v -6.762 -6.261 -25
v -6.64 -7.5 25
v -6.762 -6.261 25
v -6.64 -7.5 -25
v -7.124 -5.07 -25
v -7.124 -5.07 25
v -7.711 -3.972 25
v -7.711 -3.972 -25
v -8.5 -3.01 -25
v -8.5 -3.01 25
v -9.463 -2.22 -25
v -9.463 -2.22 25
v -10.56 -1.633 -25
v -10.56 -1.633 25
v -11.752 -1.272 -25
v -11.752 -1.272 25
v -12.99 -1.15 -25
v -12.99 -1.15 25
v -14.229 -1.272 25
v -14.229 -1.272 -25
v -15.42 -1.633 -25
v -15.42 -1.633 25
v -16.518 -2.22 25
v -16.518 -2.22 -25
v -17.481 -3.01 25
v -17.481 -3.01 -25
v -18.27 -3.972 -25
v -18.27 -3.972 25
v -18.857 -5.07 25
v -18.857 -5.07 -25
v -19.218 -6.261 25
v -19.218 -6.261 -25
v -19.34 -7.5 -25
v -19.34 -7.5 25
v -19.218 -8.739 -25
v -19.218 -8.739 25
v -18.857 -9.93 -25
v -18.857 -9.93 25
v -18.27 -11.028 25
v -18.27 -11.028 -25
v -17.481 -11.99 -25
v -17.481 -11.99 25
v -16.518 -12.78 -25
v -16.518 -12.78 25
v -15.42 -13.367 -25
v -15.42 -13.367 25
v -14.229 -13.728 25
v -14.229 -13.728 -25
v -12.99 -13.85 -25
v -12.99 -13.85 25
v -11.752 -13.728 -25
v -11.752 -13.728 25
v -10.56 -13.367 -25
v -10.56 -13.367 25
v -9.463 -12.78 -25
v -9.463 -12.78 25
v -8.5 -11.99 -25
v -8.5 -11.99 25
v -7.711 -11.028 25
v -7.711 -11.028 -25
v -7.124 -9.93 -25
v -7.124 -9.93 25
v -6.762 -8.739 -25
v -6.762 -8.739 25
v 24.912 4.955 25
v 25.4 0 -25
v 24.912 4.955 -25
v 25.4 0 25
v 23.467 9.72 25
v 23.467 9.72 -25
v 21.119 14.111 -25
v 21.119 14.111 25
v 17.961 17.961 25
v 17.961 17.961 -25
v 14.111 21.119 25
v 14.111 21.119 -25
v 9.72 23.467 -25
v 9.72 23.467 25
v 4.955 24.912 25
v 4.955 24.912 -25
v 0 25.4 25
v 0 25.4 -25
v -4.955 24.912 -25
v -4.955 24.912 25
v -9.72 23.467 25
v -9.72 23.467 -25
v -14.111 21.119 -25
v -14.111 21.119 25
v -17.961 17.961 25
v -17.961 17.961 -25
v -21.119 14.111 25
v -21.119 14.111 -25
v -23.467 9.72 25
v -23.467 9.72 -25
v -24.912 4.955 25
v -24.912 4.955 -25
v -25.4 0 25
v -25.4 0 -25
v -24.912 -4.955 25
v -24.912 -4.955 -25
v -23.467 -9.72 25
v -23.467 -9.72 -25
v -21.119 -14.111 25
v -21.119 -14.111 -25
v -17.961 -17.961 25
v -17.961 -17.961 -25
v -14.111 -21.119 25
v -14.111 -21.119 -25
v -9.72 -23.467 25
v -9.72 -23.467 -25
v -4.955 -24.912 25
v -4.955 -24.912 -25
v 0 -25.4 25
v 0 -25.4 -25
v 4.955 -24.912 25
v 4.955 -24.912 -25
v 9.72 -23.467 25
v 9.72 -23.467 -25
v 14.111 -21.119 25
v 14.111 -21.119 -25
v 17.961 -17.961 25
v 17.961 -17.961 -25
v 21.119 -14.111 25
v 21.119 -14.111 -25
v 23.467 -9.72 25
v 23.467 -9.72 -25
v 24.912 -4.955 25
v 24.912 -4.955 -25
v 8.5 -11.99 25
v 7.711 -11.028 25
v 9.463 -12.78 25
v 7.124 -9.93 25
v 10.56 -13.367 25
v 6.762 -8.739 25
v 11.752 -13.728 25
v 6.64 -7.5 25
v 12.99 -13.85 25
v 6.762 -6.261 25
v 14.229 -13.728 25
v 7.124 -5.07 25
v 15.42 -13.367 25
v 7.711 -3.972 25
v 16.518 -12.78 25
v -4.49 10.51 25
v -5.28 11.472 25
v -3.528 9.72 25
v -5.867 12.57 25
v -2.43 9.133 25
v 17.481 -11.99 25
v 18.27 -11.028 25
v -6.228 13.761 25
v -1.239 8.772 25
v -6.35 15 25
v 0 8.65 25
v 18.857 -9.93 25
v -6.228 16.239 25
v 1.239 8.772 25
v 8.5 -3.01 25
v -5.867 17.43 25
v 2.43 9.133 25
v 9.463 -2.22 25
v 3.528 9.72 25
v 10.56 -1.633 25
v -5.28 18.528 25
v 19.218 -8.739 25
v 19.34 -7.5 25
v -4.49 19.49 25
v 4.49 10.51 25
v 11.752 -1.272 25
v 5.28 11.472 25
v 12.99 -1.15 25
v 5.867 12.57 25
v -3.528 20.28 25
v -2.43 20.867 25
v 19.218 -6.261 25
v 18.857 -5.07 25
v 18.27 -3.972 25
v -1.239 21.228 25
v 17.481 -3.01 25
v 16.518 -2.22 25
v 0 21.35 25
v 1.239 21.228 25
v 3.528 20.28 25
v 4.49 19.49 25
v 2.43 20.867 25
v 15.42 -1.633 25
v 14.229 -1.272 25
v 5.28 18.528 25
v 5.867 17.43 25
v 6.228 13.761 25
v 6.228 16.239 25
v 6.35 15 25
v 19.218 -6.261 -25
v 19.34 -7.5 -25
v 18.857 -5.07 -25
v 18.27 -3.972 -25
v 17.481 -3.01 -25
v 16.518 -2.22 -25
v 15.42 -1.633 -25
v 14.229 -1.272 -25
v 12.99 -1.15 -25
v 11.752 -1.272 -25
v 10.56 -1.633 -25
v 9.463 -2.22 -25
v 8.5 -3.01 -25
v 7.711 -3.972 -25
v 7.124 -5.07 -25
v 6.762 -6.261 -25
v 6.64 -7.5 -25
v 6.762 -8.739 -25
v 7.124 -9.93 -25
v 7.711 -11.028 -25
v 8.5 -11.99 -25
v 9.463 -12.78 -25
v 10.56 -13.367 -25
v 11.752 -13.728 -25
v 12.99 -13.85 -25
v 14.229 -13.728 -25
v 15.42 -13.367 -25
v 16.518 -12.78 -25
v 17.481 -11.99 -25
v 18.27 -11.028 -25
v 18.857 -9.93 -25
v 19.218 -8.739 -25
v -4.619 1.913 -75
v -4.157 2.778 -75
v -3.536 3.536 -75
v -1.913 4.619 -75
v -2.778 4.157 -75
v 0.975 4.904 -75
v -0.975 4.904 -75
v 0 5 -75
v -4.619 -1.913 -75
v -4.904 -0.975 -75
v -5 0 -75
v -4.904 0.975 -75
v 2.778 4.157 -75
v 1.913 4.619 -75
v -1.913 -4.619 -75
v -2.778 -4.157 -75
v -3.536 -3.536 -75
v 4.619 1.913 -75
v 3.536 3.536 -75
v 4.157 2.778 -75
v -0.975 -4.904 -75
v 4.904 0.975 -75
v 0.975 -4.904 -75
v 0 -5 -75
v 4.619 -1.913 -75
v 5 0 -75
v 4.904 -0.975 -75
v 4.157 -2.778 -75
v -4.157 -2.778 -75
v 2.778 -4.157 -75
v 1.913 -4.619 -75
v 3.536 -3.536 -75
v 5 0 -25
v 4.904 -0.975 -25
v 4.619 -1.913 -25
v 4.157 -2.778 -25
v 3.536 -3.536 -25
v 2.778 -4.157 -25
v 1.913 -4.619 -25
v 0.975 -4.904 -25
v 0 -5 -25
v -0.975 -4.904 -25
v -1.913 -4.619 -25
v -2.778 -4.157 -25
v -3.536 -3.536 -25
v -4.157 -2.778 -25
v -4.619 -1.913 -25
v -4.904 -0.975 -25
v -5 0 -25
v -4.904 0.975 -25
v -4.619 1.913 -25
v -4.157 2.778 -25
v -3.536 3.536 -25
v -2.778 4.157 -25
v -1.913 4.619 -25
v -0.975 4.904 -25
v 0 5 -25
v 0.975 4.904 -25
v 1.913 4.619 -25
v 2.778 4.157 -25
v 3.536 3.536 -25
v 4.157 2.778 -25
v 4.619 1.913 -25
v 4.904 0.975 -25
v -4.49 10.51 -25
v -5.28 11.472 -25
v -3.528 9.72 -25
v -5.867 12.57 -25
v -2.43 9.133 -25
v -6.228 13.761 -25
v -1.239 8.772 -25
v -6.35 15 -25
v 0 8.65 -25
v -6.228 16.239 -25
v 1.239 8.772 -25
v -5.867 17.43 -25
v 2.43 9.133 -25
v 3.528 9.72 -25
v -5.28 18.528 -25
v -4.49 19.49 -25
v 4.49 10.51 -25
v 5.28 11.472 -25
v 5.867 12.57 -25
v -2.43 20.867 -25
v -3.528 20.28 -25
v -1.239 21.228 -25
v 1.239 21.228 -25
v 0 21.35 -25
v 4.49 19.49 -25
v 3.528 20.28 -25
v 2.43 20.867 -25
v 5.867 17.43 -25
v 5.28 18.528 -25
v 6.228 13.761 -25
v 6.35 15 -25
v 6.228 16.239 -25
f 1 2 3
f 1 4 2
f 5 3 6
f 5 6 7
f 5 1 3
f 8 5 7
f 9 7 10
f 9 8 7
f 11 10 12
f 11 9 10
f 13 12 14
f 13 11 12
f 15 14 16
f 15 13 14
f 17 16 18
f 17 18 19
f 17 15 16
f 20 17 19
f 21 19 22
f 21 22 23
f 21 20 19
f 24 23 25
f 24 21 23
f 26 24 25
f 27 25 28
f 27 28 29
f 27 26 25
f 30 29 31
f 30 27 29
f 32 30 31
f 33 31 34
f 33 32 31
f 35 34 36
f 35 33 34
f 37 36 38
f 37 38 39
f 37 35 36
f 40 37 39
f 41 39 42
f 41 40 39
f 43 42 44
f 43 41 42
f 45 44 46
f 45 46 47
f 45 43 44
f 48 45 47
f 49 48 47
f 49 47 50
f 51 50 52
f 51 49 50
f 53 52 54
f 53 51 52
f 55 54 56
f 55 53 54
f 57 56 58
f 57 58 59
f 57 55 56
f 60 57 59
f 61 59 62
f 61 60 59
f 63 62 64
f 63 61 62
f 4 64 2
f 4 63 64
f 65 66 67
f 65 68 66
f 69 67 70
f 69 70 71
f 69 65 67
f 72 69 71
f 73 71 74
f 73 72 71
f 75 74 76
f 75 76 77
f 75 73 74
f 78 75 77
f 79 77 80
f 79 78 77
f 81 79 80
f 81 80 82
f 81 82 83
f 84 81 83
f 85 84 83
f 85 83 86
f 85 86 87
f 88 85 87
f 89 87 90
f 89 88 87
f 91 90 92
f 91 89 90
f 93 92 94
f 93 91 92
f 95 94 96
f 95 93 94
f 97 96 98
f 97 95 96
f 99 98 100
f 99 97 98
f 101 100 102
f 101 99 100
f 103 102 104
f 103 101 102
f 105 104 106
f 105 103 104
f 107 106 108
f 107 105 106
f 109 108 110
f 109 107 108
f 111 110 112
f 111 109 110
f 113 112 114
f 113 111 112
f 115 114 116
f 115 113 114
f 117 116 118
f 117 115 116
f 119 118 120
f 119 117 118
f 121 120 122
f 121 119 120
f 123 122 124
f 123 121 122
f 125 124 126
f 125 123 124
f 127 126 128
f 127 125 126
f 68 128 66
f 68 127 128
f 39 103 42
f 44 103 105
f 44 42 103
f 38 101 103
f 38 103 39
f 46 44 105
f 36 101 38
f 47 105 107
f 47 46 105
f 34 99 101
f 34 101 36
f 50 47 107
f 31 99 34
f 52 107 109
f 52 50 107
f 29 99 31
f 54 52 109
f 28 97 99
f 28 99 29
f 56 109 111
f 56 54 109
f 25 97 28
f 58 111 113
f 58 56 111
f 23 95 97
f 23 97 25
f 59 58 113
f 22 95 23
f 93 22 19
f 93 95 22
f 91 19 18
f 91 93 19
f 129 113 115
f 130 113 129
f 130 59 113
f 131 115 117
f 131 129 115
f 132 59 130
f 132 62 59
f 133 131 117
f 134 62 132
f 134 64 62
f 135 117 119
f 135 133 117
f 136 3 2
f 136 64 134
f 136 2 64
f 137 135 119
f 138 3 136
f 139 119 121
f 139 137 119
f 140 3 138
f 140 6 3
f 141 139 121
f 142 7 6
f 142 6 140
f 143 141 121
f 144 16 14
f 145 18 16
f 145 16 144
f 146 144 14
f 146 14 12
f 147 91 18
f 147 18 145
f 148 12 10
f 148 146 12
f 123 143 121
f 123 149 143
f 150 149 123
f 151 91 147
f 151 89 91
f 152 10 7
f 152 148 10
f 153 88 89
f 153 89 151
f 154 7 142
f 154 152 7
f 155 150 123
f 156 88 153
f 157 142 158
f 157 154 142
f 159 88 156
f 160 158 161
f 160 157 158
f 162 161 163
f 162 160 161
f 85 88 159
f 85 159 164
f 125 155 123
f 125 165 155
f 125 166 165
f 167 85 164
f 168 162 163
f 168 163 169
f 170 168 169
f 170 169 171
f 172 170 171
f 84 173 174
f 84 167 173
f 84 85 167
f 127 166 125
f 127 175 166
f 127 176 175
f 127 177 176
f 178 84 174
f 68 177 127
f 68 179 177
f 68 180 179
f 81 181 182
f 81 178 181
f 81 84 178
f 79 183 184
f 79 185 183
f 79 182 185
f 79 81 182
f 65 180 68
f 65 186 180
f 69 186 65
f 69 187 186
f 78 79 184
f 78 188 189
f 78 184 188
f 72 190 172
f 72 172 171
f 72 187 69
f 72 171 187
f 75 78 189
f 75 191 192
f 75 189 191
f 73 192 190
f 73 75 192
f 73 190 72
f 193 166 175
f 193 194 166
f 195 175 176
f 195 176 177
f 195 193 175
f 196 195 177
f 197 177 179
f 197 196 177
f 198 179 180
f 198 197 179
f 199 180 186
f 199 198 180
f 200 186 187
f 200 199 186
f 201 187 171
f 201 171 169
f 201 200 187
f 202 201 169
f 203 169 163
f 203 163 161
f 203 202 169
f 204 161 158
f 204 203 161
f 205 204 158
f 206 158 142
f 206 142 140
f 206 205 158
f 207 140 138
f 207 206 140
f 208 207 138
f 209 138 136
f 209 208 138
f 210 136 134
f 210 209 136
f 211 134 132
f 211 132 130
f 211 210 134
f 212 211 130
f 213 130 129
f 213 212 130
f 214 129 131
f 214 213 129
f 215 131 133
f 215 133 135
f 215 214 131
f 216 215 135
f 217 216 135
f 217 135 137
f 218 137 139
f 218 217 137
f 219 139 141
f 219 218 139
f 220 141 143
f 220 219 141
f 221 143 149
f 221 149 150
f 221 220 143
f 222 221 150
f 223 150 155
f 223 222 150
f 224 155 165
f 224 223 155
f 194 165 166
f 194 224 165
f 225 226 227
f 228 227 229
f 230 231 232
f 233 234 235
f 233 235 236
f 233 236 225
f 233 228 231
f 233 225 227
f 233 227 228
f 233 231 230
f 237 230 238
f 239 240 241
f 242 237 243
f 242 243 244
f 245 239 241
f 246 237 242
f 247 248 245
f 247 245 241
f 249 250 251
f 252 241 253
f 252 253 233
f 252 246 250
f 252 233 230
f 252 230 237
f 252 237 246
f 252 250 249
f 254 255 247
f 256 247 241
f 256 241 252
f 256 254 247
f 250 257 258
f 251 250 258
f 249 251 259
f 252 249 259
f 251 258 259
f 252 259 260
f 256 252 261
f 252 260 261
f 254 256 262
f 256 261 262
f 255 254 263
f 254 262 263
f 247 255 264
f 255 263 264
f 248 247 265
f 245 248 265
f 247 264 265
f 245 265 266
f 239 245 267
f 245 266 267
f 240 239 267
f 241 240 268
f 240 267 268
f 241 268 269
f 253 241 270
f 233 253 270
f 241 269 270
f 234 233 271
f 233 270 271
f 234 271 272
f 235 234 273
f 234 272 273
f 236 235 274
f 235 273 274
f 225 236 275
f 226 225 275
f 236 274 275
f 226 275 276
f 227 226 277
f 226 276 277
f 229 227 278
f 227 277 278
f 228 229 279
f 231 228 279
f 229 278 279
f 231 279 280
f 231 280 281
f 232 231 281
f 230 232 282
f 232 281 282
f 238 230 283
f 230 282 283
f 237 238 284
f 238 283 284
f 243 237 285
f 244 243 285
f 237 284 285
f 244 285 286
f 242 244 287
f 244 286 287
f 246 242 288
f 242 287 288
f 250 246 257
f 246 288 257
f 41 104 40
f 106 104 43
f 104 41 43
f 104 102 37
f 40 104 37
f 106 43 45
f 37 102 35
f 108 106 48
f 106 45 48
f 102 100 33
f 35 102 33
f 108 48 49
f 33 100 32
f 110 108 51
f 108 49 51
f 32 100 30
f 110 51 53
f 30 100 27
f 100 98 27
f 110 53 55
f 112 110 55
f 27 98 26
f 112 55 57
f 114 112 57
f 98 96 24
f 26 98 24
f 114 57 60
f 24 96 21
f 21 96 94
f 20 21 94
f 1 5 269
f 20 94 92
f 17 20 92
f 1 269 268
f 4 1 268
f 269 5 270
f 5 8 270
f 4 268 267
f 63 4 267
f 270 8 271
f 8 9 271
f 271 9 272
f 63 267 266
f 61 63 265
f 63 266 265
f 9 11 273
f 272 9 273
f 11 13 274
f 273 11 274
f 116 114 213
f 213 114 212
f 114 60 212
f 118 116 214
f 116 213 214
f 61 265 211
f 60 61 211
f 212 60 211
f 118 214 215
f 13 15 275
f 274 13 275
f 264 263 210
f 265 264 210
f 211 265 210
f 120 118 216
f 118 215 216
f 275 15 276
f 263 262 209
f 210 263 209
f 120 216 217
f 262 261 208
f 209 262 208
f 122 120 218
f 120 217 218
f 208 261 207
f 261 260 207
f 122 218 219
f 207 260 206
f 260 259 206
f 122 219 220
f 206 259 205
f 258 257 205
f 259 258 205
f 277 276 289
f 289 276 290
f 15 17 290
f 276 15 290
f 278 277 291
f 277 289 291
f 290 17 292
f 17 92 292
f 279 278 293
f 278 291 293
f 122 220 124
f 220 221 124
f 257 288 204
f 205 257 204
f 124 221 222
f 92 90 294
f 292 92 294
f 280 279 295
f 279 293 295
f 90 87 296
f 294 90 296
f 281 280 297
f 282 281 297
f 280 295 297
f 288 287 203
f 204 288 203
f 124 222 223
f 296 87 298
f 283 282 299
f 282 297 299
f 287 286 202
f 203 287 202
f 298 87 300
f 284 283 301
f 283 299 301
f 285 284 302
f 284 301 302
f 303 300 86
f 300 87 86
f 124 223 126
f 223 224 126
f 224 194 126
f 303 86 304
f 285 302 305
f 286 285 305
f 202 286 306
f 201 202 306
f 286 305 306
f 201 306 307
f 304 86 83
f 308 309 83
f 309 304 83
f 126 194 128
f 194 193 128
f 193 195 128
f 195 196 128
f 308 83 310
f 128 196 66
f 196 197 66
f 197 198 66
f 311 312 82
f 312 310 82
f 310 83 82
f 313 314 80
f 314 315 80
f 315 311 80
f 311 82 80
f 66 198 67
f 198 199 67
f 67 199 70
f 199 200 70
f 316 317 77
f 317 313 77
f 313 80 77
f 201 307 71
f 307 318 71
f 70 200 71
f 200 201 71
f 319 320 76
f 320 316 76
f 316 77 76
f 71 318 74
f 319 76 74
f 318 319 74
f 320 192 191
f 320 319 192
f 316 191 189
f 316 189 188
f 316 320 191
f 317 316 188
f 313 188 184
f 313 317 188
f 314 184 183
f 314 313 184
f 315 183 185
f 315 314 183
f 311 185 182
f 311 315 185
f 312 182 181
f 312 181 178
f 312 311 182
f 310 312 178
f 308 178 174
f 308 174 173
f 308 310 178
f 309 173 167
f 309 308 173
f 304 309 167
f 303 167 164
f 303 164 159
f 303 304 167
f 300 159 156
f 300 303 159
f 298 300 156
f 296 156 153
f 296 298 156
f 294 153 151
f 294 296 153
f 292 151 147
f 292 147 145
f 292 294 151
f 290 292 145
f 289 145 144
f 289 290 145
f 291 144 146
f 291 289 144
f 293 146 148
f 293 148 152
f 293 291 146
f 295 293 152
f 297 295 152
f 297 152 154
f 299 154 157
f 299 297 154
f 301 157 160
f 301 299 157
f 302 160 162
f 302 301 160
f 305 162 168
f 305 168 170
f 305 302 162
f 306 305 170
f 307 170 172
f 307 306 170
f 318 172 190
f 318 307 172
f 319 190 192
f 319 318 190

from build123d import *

# Parameters (mm, degrees)
F0_R     = 25.4
F0_R_2   = 6.35
F1_DEPTH = 25
F2_R     = 5
F3_DEPTH = 50


with BuildPart() as f1:
    # F0 (on Top) → F1 (new body, symmetric)
    with BuildSketch(Plane.XY):
        Circle(F0_R)
        with Locations((-12.990381, -7.5)):
            Circle(F0_R_2, mode=Mode.SUBTRACT)
        with Locations((12.990381, -7.5)):
            Circle(F0_R_2, mode=Mode.SUBTRACT)
        with Locations((0, 15)):
            Circle(F0_R_2, mode=Mode.SUBTRACT)
    extrude(amount=F1_DEPTH, both=True)

    # F2 (on face) → F3 (join)
    with BuildSketch(Plane(origin=(0, 0, -25), x_dir=(1, 0, 0), z_dir=(0, 0, -1))):
        Circle(F2_R)
    extrude(amount=F3_DEPTH)


solid = f1.part
